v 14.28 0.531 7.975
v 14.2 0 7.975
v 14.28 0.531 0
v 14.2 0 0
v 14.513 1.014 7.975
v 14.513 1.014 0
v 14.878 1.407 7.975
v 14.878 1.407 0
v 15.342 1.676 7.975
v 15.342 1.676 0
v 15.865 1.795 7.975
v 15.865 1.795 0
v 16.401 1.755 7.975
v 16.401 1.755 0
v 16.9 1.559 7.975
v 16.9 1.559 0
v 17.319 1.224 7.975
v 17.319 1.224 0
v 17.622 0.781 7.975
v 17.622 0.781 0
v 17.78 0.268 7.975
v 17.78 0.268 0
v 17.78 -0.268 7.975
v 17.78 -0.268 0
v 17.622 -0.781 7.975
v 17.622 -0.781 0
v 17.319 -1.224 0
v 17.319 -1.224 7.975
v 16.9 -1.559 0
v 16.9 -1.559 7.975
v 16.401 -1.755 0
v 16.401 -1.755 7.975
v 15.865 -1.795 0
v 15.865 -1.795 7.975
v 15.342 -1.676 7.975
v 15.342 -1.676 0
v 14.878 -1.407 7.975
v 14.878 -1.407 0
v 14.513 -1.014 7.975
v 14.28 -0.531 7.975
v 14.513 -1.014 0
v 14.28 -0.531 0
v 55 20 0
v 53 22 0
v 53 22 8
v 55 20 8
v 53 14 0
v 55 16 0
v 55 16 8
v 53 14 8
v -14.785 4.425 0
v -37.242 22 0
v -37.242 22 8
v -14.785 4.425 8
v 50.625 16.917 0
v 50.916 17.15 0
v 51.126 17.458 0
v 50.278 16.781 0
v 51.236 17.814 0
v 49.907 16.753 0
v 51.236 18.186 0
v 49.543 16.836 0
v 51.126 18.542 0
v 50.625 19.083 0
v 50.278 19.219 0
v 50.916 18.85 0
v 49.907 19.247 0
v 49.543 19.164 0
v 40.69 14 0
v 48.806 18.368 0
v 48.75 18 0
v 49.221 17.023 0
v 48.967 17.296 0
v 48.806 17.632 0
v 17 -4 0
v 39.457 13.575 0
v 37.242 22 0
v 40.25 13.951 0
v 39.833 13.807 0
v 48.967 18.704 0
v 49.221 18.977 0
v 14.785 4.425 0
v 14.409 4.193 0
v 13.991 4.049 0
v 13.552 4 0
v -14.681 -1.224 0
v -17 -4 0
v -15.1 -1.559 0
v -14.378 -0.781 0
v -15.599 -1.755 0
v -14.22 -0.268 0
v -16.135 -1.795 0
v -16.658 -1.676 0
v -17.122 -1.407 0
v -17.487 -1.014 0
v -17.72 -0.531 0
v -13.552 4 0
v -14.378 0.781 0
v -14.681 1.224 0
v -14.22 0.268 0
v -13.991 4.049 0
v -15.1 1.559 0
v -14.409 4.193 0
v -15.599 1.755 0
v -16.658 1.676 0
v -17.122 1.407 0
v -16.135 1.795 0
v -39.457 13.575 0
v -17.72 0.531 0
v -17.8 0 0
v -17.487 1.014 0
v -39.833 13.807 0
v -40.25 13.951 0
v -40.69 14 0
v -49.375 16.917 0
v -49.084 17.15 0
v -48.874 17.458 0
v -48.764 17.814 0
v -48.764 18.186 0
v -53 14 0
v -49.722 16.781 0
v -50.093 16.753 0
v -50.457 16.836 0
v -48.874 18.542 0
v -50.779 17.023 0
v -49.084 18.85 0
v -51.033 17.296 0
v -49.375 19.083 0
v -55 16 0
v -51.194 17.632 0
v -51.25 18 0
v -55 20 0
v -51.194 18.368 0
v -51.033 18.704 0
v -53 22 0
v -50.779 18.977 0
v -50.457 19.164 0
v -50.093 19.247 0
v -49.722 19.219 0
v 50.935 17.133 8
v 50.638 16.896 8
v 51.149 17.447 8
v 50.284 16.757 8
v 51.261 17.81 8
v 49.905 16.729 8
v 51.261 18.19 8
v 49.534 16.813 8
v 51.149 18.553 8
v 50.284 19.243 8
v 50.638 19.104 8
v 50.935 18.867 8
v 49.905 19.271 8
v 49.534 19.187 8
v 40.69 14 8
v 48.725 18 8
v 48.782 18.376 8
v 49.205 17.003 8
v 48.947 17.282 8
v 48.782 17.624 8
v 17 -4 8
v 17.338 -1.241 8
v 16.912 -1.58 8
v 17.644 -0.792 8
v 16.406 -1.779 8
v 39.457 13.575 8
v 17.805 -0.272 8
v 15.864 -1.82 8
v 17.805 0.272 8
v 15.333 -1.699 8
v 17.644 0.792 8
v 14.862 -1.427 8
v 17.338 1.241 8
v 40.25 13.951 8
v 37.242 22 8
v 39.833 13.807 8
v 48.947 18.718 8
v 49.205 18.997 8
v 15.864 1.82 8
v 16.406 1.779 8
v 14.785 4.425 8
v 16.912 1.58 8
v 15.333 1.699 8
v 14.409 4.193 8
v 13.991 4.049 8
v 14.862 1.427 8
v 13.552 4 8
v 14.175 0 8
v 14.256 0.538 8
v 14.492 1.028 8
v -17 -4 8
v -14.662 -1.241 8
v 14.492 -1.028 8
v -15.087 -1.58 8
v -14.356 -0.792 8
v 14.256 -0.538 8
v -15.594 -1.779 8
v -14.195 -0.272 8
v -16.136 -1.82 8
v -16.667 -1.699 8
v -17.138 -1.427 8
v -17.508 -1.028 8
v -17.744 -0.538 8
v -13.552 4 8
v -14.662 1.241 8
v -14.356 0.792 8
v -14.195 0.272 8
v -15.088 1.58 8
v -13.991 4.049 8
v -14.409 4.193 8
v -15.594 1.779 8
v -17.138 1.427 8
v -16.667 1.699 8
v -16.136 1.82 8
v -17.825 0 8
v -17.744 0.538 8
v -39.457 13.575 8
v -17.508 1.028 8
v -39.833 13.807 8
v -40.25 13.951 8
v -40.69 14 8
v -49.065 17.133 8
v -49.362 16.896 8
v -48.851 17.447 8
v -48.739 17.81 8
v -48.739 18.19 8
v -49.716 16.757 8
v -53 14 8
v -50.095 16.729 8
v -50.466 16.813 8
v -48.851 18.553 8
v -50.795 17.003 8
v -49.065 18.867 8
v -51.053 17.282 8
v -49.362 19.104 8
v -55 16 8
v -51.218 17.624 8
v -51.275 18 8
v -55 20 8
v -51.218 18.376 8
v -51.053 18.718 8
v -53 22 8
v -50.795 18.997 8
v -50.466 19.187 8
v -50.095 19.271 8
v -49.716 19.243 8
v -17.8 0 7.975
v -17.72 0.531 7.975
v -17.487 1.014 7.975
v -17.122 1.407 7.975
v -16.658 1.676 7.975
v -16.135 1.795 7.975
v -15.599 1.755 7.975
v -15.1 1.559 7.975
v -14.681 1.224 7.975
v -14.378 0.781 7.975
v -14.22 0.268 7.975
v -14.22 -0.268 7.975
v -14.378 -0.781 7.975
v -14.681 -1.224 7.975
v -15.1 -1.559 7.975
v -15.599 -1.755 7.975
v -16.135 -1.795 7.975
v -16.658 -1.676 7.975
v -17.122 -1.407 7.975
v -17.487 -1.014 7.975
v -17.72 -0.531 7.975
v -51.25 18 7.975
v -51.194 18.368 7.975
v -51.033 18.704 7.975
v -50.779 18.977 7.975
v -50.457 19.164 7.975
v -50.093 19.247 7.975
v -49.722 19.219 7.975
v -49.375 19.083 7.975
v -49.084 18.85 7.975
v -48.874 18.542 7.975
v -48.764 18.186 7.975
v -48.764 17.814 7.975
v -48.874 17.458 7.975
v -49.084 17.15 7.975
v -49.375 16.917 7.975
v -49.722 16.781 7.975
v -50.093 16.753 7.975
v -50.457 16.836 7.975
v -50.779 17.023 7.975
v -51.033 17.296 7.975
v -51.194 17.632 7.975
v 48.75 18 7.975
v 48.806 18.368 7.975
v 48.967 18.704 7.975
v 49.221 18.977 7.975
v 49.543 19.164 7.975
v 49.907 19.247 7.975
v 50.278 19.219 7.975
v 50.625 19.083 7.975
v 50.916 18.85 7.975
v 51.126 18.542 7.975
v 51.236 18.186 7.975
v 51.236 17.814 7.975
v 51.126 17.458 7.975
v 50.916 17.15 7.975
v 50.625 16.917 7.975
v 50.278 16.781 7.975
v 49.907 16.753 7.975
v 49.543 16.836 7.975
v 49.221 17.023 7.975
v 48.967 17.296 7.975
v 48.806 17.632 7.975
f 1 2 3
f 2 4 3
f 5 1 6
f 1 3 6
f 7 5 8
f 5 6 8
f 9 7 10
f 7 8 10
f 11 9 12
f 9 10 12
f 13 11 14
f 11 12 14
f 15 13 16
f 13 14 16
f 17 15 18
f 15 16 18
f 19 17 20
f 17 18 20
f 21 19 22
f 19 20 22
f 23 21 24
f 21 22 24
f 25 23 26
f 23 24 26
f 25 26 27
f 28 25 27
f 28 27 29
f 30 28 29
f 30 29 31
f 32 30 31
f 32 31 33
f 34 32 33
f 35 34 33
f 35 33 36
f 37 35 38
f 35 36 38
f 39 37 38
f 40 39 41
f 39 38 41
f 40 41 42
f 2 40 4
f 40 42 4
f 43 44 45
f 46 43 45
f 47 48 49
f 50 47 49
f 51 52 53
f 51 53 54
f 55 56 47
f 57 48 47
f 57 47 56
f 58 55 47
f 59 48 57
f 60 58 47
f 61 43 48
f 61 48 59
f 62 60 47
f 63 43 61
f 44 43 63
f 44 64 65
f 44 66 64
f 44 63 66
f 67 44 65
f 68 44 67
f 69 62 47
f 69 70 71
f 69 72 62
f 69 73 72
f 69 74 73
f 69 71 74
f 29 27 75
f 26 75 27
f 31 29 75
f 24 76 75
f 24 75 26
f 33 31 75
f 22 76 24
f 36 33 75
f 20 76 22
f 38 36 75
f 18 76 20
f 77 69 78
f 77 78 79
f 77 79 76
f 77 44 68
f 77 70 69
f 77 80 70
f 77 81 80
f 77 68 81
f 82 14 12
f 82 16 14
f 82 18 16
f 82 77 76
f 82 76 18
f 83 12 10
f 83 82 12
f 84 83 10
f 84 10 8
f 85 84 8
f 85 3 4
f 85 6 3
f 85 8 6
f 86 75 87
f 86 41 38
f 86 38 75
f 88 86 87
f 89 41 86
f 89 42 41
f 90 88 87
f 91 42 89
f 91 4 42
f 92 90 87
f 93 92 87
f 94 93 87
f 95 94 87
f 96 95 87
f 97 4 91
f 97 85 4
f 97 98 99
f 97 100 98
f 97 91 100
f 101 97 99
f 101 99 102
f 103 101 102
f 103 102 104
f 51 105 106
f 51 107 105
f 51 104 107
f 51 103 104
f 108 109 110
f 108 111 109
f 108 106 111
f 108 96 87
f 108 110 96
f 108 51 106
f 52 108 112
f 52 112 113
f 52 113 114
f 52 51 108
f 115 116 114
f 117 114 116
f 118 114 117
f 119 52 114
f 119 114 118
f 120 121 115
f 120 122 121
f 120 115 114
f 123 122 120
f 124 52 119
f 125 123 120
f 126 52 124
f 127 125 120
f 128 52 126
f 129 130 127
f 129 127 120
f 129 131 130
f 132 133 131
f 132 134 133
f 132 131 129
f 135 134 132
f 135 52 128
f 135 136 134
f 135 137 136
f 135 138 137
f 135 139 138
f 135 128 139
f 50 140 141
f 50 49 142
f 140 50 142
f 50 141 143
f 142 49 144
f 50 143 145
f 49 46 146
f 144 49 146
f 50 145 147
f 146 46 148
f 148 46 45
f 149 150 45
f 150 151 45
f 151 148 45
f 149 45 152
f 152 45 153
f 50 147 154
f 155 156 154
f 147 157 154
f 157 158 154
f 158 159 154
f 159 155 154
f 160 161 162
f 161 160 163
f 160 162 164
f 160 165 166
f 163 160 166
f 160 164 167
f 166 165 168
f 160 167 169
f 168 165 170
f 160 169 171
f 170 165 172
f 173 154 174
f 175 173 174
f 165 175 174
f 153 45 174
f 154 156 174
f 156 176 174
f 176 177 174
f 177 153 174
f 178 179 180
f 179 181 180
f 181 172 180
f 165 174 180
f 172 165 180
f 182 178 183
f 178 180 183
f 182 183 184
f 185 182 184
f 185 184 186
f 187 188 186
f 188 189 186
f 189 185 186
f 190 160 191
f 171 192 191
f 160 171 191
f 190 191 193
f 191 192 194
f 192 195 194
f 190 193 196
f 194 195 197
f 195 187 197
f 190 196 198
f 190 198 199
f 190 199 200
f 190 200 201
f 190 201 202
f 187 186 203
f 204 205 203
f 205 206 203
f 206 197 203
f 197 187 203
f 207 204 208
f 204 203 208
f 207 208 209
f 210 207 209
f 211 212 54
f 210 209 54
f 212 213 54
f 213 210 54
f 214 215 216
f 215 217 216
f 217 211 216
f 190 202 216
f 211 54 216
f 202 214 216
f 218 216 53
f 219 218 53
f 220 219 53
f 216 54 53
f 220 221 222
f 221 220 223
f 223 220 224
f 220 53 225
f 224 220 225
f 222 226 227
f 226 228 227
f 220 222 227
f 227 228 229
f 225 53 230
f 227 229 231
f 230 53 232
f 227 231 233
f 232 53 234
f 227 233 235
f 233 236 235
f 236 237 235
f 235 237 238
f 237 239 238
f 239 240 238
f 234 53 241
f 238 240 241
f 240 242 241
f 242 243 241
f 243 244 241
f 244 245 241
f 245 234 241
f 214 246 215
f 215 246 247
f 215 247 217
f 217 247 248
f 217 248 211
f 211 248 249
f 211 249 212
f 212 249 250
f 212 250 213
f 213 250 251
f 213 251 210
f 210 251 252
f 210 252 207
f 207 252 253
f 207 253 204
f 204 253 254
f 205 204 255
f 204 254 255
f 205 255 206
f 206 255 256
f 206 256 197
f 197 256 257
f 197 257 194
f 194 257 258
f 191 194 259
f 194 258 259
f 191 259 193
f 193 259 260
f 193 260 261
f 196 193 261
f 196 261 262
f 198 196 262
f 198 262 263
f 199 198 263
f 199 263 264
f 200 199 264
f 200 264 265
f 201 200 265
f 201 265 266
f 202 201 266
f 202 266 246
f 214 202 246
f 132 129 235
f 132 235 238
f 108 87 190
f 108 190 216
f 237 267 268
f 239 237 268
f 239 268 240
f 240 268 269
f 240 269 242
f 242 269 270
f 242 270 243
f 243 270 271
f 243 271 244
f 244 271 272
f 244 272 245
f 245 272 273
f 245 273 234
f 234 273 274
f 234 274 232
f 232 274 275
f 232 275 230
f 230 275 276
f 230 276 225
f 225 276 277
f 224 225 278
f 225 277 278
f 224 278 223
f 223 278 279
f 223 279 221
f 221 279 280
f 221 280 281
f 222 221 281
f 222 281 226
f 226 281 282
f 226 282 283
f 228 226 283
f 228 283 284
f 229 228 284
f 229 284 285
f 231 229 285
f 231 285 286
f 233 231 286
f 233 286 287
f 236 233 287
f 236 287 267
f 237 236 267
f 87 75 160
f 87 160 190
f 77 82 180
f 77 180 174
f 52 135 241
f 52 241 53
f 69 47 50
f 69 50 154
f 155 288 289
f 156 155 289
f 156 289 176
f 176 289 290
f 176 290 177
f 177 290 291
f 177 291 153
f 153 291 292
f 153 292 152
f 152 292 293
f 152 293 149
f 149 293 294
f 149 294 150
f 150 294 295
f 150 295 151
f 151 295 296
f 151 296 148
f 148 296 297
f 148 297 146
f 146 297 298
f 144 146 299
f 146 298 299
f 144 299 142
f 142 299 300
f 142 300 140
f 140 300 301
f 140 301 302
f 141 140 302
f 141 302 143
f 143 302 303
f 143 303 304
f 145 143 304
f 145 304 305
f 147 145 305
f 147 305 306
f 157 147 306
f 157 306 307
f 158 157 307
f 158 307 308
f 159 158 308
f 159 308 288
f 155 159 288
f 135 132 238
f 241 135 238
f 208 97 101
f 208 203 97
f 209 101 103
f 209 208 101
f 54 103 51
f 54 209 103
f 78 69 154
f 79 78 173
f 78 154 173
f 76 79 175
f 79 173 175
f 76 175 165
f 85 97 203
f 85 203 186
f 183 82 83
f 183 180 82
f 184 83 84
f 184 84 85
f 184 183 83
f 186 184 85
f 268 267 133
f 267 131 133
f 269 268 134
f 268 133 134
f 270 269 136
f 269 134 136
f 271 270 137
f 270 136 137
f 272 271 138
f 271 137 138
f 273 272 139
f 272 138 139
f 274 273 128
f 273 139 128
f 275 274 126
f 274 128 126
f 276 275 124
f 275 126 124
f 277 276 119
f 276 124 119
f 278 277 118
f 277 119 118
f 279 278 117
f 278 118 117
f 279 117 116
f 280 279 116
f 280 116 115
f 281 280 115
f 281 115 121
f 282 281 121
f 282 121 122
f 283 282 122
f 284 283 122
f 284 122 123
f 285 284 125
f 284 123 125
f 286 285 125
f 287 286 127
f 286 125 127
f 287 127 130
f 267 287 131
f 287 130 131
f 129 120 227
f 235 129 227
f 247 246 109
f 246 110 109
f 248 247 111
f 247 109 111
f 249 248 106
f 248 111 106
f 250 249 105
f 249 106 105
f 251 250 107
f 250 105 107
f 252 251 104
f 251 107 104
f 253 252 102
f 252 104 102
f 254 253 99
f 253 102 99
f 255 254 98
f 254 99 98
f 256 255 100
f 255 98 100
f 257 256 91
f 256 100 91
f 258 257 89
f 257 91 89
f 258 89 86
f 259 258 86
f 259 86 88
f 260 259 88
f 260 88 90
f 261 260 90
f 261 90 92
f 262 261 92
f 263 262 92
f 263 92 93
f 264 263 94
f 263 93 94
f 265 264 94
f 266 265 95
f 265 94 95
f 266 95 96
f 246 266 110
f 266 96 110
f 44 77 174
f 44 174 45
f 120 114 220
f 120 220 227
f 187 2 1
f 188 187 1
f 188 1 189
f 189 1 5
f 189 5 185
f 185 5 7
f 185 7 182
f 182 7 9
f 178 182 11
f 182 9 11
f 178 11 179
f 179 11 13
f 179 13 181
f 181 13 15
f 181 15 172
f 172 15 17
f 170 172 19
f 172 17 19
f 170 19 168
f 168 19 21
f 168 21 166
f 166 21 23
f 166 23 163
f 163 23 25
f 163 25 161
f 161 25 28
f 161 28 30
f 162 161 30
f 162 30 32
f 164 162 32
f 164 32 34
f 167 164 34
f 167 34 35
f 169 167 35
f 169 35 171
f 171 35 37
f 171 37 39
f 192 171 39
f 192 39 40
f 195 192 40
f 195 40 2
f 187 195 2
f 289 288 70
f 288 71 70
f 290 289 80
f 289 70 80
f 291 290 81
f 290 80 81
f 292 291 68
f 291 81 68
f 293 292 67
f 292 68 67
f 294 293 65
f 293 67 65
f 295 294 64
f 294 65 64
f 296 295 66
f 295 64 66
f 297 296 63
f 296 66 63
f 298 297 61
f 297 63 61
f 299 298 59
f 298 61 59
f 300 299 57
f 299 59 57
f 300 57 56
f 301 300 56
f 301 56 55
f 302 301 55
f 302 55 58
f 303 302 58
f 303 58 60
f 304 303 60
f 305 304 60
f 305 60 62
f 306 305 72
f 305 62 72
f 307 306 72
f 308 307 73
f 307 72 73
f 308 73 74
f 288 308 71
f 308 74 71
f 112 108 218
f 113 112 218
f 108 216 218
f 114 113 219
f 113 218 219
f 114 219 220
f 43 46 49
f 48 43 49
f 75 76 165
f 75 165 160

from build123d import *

# Parameters (mm, degrees)
SKETCH1_R                             = 1
BOSS_EXTRUDE1_DEPTH                   = 8
TAP_DRILL_FOR_M3X0_5_TAP1_D           = 2.5
TAP_DRILL_FOR_M3X0_5_TAP1_CSINK_D     = 2.55
TAP_DRILL_FOR_M3X0_5_TAP1_CSINK_ANGLE = 90
M3_CLEARANCE_HOLE1_D                  = 3.6
M3_CLEARANCE_HOLE1_CSINK_D            = 3.65
M3_CLEARANCE_HOLE1_CSINK_ANGLE        = 90
CHAMFER3_SIZE                         = 2
FILLET1_R                             = 2


with BuildPart() as part:
    # Sketch1 → Boss-Extrude1 (new body)
    with BuildSketch(Plane.XY):
        Polygon((-14.241705008, 4), (14.241705008, 4), (37.241705008, 22), (55, 22), (55, 14), (40, 14), (17, -4), (-17, -4), (-40, 14), (-55, 14), (-55, 22), (-37.241705008, 22), align=None)
        with Locations((16, 0)):
            Circle(SKETCH1_R, mode=Mode.SUBTRACT)
        with Locations((50, 18)):
            Circle(SKETCH1_R, mode=Mode.SUBTRACT)
        with Locations(Location((-50, 18, 0), (0, 0, 180))):
            Circle(SKETCH1_R, mode=Mode.SUBTRACT)
        with Locations(Location((-16, 0, 0), (0, 0, 180))):
            Circle(SKETCH1_R, mode=Mode.SUBTRACT)
    extrude(amount=BOSS_EXTRUDE1_DEPTH)

    # Tap Drill for M3x0.5 Tap1 (through all)
    with Locations(Plane.XY.offset(8)):
        with Locations((50, 18), (-50, 18)):
            CounterSinkHole(TAP_DRILL_FOR_M3X0_5_TAP1_D / 2, TAP_DRILL_FOR_M3X0_5_TAP1_CSINK_D / 2, counter_sink_angle=TAP_DRILL_FOR_M3X0_5_TAP1_CSINK_ANGLE)

    # M3 Clearance Hole1 (through all)
    with Locations(Plane.XY.offset(8)):
        with Locations((-16, 0), (16, 0)):
            CounterSinkHole(M3_CLEARANCE_HOLE1_D / 2, M3_CLEARANCE_HOLE1_CSINK_D / 2, counter_sink_angle=M3_CLEARANCE_HOLE1_CSINK_ANGLE)

    # Chamfer3
    chamfer3_edges = [part.edges().sort_by_distance(p)[0] for p in [
        (55, 22, 4),
        (55, 14, 4),
        (-55, 14, 4),
        (-55, 22, 4),
    ]]
    chamfer(chamfer3_edges, length=CHAMFER3_SIZE)

    # Fillet1
    fillet1_edges = [part.edges().sort_by_distance(p)[0] for p in [
        (40, 14, 4),
        (-40, 14, 4),
        (-14.241705008, 4, 4),
        (14.241705008, 4, 4),
    ]]
    fillet(fillet1_edges, radius=FILLET1_R)


solid = part.part
